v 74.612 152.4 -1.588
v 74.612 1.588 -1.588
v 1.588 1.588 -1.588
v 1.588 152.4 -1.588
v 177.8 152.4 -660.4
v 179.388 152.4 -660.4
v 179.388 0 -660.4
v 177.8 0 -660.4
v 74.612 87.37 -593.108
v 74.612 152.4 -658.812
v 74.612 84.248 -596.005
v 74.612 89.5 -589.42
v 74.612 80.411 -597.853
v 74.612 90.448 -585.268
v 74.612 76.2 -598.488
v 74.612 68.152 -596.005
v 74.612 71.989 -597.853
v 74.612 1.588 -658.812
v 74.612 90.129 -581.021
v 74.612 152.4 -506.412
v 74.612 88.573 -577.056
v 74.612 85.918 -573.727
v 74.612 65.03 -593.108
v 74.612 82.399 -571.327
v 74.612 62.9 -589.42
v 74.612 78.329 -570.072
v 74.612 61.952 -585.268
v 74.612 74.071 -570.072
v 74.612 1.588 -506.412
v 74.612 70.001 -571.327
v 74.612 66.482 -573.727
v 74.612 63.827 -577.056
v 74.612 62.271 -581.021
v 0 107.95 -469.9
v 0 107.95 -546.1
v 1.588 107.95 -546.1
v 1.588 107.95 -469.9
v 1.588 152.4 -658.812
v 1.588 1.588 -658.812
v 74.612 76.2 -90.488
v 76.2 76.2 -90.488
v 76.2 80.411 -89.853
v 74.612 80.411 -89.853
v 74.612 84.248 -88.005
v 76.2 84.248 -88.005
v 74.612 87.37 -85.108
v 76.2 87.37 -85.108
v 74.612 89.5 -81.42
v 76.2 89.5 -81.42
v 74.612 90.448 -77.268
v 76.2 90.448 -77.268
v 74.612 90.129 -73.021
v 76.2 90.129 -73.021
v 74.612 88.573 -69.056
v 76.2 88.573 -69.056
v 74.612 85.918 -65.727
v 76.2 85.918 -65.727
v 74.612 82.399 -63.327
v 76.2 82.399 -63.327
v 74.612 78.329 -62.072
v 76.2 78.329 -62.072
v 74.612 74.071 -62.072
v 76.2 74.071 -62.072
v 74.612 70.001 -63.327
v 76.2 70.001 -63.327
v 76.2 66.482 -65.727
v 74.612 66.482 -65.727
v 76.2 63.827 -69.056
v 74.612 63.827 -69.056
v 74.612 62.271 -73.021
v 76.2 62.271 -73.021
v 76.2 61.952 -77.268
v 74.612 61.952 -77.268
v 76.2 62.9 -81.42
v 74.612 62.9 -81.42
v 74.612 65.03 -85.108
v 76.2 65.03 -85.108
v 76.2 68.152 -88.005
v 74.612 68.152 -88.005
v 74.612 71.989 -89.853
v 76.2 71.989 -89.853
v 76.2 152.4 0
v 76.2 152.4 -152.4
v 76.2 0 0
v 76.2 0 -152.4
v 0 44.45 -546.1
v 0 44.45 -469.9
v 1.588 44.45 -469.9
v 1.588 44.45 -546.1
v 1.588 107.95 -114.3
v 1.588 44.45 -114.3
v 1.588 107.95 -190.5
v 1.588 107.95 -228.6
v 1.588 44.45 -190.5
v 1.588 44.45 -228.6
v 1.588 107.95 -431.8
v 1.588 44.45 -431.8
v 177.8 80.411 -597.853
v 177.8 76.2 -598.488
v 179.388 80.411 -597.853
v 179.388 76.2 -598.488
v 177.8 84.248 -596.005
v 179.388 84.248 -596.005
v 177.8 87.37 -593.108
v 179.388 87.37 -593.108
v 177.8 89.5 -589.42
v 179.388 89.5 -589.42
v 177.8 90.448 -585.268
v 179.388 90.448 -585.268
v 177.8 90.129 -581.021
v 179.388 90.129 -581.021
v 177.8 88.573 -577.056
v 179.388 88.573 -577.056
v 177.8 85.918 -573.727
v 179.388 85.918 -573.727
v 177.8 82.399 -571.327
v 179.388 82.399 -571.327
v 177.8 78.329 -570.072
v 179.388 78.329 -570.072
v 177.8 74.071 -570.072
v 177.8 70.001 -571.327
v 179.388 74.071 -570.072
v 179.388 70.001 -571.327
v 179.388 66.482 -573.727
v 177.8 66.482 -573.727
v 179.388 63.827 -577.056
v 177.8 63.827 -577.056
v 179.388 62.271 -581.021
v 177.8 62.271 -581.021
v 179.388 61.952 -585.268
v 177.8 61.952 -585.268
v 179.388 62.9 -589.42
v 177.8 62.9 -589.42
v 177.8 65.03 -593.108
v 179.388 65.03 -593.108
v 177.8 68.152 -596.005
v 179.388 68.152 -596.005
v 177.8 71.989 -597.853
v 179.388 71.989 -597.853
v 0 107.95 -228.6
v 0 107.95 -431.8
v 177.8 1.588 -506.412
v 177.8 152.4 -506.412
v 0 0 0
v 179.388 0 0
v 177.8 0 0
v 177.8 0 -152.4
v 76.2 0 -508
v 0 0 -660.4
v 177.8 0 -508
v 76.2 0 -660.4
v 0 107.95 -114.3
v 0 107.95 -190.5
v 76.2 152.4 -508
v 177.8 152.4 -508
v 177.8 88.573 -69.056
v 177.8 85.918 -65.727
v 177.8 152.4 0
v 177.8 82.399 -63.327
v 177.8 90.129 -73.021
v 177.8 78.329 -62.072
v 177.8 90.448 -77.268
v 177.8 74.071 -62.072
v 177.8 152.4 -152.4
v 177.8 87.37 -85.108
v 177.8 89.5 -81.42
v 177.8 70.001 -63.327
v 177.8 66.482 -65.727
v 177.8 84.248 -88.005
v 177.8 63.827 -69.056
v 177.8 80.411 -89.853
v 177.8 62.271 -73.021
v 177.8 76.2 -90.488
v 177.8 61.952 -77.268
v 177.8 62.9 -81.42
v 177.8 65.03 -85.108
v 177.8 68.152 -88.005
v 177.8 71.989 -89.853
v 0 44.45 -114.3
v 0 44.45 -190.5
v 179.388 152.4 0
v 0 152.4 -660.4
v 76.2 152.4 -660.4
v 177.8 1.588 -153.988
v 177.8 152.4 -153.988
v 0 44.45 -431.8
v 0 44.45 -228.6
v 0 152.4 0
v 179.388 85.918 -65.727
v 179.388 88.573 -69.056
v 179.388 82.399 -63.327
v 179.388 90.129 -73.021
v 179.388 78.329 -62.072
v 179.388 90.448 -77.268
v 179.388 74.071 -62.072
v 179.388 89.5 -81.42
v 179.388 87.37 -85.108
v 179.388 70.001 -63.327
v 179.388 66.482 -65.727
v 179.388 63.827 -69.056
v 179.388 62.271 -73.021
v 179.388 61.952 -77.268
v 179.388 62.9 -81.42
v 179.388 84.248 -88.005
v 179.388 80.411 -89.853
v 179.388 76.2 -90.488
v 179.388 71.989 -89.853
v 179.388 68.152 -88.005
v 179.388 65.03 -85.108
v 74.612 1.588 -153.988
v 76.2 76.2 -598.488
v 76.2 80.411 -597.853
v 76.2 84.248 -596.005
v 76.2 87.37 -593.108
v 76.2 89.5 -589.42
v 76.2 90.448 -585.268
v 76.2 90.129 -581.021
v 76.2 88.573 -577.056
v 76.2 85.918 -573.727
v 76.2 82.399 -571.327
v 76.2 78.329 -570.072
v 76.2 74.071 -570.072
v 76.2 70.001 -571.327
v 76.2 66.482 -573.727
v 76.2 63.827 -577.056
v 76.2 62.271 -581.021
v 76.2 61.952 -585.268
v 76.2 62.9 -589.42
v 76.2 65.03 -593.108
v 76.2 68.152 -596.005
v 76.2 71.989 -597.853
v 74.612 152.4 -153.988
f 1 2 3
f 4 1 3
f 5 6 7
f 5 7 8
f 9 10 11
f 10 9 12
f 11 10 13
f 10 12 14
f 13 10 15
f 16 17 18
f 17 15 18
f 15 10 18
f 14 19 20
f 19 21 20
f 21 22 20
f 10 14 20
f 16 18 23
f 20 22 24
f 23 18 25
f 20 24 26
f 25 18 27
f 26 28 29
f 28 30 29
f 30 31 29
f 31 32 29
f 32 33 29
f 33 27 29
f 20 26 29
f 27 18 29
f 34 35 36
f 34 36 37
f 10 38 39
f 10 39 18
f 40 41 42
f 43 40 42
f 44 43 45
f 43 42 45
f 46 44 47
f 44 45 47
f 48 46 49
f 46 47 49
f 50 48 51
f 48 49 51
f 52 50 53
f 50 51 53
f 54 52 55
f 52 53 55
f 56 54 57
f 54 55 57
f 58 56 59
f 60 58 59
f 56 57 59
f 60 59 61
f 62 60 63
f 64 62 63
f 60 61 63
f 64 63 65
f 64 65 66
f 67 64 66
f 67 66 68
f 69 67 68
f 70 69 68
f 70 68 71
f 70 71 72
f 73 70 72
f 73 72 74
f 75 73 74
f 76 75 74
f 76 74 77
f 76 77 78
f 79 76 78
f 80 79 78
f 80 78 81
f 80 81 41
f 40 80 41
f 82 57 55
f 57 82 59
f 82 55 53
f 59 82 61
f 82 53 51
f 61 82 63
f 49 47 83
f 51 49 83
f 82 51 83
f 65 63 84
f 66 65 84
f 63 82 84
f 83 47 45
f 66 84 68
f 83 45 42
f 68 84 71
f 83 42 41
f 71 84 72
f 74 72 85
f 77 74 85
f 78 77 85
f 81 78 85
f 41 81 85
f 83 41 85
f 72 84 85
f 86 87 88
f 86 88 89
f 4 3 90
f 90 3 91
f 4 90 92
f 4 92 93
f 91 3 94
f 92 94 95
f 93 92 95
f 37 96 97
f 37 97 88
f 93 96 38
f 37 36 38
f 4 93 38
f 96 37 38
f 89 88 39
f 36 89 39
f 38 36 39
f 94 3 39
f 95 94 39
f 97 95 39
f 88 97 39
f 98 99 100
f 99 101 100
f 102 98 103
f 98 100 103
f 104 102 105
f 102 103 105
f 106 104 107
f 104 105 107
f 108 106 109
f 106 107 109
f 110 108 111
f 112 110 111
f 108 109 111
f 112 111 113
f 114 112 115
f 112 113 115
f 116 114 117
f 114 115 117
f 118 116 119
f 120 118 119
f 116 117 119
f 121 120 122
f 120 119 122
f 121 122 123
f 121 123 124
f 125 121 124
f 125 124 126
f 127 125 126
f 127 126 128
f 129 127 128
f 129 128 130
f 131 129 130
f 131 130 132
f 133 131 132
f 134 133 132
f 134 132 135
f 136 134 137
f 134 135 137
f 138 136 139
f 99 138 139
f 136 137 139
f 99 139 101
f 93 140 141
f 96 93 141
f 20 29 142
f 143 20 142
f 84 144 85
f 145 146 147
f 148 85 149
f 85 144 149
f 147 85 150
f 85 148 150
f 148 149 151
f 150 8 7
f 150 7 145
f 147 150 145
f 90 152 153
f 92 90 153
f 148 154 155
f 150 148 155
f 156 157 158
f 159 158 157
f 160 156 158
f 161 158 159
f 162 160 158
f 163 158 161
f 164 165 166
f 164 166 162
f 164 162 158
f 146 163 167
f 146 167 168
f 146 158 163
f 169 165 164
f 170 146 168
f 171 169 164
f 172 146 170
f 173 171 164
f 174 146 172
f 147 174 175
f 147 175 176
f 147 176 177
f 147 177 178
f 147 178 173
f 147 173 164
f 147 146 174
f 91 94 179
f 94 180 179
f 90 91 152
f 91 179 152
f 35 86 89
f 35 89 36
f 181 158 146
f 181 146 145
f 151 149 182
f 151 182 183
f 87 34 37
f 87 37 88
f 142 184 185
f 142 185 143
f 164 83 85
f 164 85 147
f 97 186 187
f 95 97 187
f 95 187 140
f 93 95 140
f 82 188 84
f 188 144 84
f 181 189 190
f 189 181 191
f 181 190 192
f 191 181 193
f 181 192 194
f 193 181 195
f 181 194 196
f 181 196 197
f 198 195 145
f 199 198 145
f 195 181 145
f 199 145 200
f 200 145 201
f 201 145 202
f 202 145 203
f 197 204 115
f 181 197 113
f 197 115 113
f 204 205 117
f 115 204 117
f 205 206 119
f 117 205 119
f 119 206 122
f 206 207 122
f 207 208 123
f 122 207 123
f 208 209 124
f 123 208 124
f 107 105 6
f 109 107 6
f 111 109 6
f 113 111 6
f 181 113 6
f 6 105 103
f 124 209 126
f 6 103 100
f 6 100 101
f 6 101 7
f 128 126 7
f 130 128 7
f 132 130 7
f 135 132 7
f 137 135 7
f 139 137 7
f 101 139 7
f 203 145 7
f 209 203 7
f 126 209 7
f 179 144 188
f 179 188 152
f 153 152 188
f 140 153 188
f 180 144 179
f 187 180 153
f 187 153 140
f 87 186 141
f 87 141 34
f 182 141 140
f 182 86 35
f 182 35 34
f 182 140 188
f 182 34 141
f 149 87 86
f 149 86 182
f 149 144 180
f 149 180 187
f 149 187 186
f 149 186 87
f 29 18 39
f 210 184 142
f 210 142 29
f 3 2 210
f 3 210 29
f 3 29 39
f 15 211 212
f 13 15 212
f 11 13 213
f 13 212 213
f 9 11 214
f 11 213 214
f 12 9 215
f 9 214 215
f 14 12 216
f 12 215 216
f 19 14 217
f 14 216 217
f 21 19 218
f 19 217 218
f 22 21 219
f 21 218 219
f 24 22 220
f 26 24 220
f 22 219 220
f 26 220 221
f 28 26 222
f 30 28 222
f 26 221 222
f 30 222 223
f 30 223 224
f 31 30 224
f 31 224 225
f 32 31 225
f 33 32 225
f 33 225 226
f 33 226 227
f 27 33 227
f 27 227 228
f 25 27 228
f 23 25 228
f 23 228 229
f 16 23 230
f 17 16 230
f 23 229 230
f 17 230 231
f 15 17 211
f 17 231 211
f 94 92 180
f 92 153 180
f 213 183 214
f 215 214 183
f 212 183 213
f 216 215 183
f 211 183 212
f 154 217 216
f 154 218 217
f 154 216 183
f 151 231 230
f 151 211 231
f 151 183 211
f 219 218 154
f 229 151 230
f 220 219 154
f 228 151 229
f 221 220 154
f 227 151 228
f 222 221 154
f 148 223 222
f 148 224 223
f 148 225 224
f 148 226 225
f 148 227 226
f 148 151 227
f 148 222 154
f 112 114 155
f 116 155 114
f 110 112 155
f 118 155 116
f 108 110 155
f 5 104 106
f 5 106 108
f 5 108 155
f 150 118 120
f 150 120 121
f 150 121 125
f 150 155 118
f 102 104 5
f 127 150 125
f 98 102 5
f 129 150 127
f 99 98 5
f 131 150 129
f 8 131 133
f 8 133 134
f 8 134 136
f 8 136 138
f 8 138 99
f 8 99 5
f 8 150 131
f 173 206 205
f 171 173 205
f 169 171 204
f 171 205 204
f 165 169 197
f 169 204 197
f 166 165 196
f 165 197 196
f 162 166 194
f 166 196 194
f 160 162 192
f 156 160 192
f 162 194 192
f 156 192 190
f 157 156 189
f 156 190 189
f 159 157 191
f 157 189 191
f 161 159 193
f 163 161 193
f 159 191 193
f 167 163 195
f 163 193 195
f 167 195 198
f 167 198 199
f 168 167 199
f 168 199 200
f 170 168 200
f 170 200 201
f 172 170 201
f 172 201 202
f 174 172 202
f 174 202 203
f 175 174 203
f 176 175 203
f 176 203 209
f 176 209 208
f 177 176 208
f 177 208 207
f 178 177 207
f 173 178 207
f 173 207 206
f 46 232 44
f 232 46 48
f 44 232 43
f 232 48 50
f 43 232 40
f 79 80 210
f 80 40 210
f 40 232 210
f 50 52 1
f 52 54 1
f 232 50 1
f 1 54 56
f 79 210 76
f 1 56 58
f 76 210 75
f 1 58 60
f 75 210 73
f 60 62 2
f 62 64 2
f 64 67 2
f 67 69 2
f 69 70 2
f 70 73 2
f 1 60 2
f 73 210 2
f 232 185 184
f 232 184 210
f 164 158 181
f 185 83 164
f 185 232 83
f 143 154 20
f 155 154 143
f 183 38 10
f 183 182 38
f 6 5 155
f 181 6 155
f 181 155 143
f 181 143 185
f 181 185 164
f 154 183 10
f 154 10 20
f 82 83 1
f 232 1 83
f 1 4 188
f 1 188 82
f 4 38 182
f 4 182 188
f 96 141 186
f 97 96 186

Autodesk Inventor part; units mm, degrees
ref_plane "YZ Plane" through (0, 0, 0) normal (1, 0, 0) x (0, 1, 0)
ref_plane "XZ Plane" through (0, 0, 0) normal (0, 1, 0) x (-1, 0, 0)
ref_plane "XY Plane" through (0, 0, 0) normal (0, 0, 1) x (1, 0, 0)
sketch "Sketch1" plane through (0, 0, 0) normal (0, 1, 0) x (-1, 0, 0)
  line L0 (0, 0) -> (-76.2, 0)
  line L1 (-76.2, 0) -> (-76.2, -152.4)
  line L2 (-76.2, -152.4) -> (-177.8, -152.4)
  line L3 (0, -660.4) -> (-76.2, -660.4)
  line L4 (-76.2, -660.4) -> (-76.2, -508)
  line L5 (-76.2, -508) -> (-177.8, -508)
  line L6 (0, 0) -> (0, -660.4)
  line L7 (-177.8, -152.4) -> (-177.8, -508)
  dimension "d4" = 660.4
  dimension "d91" = 152.4
  dimension "d92" = 152.4
  dimension "d95" = 177.8
  dimension "d96" = 101.6
  dimension "d97" = 101.6
  dimension "d98" = 177.8
extrude "Extrusion1" add sketch "Sketch1" along normal blind 1.5875
sketch "Sketch3" plane through (0, 1.5875, 0) normal (0, 1, 0) x (1, 0, 0)
  line L0 (0, 0) -> (76.2, 0) projected
  line L1 (76.2, 0) -> (76.2, 152.4) projected
  line L2 (76.2, 152.4) -> (177.8, 152.4) projected
  line L3 (177.8, 152.4) -> (177.8, 508) projected
  line L4 (177.8, 508) -> (76.2, 508) projected
  line L5 (76.2, 508) -> (76.2, 660.4) projected
  line L6 (76.2, 660.4) -> (0, 660.4) projected
  line L7 (0, 660.4) -> (0, 0) projected
  line L8 (1.5875, 658.8125) -> (74.6125, 658.8125)
  line L9 (74.6125, 658.8125) -> (74.6125, 506.4125)
  line L10 (74.6125, 506.4125) -> (177.8, 506.4125)
  line L11 (177.8, 153.9875) -> (74.6125, 153.9875)
  line L12 (74.6125, 153.9875) -> (74.6125, 1.5875)
  line L13 (74.6125, 1.5875) -> (1.5875, 1.5875)
  line L14 (1.5875, 1.5875) -> (1.5875, 658.8125)
  line L15 (177.8, 0) -> (179.3875, 0)
  line L16 (179.3875, 0) -> (179.3875, 660.4)
  line L17 (179.3875, 660.4) -> (177.8, 660.4)
  line L18 (177.8, 660.4) -> (177.8, 0)
  dimension "d114" = 1.5875
  dimension "d115" = 1.5875
  dimension "d116" = 1.5875
extrude "Extrusion4" add sketch "Sketch3" along normal blind 150.8125 contours L7 L6 L5 L4 L3 L10 L9 L8 L14 L13 L12 L11 L2 L1 L0
sketch "Sketch6" plane through (0, 0, -660.4) normal (-1, 0, 0) x (0, 0, 1)
  line L0 (330.2, 152.4) -> (330.2, 0) construction
  line L1 (0, 76.2) -> (660.4, 76.2) construction
  line L2 (228.6, 44.45) -> (431.8, 44.45)
  line L3 (431.8, 44.45) -> (431.8, 107.95)
  line L4 (431.8, 107.95) -> (228.6, 107.95)
  line L5 (228.6, 107.95) -> (228.6, 44.45)
  line L6 (228.6, 44.45) -> (431.8, 107.95) construction
  line L7 (431.8, 44.45) -> (228.6, 107.95) construction
  line L8 (190.5, 44.45) -> (114.3, 44.45)
  line L9 (114.3, 44.45) -> (114.3, 107.95)
  line L10 (114.3, 107.95) -> (190.5, 107.95)
  line L11 (190.5, 107.95) -> (190.5, 44.45)
  line L12 (190.5, 44.45) -> (114.3, 107.95) construction
  line L13 (114.3, 44.45) -> (190.5, 107.95) construction
  line L14 (469.9, 44.45) -> (546.1, 44.45)
  line L15 (546.1, 44.45) -> (546.1, 107.95)
  line L16 (546.1, 107.95) -> (469.9, 107.95)
  line L17 (469.9, 107.95) -> (469.9, 44.45)
  line L18 (469.9, 44.45) -> (546.1, 107.95) construction
  line L19 (546.1, 44.45) -> (469.9, 107.95) construction
  line L20 (0, 152.4) -> (660.4, 152.4) projected
  line L21 (0, 0) -> (0, 152.4) projected
  point P0 (330.2, 76.2)
  point P1 (152.4, 76.2)
  point P2 (508, 76.2)
  dimension "d21" = 203.2
  dimension "d22" = 63.5
  dimension "d23" = 76.2
  dimension "d24" = 63.5
  dimension "d25" = 38.1
  dimension "d26" = 76.2
  dimension "d27" = 63.5
  dimension "d28" = 38.1
extrude "Extrusion6" add sketch "Sketch3" along normal blind 150.8125 and the other way blind 1.5875 contours L3 L18 L17 L16 L15
extrude "Extrusion7" cut sketch "Sketch6" against normal up to surface (1.5875 mm away)
sketch "Sketch8" plane through (179.3875, 0, -660.4) normal (1, 0, 0) x (0, 0, -1)
  circle A0 centre (-584.2, 76.2) radius 14.2875
  circle A1 centre (-76.2, 76.2) radius 14.2875
  line L0 (-660.4, 152.4) -> (0, 152.4) projected
  line L1 (-660.4, 0) -> (-660.4, 152.4) projected
  line L2 (0, 0) -> (0, 152.4) projected
  dimension "d117" = 28.575
  dimension "d118" = 28.575
  dimension "d119" = 76.2
  dimension "d120" = 76.2
  dimension "d121" = 76.2
  dimension "d122" = 76.2
extrude "Extrusion9" cut sketch "Sketch8" against normal up to surface (104.775 mm away)
equation "\"d96\" = d97"
equation "\"d98\" = d95"
equation "\"d24\" = d22"
equation "\"d27\" = d22"
equation "\"d28\" = d25"
properties part number "DriveHousing" material "Aluminum 6061"
